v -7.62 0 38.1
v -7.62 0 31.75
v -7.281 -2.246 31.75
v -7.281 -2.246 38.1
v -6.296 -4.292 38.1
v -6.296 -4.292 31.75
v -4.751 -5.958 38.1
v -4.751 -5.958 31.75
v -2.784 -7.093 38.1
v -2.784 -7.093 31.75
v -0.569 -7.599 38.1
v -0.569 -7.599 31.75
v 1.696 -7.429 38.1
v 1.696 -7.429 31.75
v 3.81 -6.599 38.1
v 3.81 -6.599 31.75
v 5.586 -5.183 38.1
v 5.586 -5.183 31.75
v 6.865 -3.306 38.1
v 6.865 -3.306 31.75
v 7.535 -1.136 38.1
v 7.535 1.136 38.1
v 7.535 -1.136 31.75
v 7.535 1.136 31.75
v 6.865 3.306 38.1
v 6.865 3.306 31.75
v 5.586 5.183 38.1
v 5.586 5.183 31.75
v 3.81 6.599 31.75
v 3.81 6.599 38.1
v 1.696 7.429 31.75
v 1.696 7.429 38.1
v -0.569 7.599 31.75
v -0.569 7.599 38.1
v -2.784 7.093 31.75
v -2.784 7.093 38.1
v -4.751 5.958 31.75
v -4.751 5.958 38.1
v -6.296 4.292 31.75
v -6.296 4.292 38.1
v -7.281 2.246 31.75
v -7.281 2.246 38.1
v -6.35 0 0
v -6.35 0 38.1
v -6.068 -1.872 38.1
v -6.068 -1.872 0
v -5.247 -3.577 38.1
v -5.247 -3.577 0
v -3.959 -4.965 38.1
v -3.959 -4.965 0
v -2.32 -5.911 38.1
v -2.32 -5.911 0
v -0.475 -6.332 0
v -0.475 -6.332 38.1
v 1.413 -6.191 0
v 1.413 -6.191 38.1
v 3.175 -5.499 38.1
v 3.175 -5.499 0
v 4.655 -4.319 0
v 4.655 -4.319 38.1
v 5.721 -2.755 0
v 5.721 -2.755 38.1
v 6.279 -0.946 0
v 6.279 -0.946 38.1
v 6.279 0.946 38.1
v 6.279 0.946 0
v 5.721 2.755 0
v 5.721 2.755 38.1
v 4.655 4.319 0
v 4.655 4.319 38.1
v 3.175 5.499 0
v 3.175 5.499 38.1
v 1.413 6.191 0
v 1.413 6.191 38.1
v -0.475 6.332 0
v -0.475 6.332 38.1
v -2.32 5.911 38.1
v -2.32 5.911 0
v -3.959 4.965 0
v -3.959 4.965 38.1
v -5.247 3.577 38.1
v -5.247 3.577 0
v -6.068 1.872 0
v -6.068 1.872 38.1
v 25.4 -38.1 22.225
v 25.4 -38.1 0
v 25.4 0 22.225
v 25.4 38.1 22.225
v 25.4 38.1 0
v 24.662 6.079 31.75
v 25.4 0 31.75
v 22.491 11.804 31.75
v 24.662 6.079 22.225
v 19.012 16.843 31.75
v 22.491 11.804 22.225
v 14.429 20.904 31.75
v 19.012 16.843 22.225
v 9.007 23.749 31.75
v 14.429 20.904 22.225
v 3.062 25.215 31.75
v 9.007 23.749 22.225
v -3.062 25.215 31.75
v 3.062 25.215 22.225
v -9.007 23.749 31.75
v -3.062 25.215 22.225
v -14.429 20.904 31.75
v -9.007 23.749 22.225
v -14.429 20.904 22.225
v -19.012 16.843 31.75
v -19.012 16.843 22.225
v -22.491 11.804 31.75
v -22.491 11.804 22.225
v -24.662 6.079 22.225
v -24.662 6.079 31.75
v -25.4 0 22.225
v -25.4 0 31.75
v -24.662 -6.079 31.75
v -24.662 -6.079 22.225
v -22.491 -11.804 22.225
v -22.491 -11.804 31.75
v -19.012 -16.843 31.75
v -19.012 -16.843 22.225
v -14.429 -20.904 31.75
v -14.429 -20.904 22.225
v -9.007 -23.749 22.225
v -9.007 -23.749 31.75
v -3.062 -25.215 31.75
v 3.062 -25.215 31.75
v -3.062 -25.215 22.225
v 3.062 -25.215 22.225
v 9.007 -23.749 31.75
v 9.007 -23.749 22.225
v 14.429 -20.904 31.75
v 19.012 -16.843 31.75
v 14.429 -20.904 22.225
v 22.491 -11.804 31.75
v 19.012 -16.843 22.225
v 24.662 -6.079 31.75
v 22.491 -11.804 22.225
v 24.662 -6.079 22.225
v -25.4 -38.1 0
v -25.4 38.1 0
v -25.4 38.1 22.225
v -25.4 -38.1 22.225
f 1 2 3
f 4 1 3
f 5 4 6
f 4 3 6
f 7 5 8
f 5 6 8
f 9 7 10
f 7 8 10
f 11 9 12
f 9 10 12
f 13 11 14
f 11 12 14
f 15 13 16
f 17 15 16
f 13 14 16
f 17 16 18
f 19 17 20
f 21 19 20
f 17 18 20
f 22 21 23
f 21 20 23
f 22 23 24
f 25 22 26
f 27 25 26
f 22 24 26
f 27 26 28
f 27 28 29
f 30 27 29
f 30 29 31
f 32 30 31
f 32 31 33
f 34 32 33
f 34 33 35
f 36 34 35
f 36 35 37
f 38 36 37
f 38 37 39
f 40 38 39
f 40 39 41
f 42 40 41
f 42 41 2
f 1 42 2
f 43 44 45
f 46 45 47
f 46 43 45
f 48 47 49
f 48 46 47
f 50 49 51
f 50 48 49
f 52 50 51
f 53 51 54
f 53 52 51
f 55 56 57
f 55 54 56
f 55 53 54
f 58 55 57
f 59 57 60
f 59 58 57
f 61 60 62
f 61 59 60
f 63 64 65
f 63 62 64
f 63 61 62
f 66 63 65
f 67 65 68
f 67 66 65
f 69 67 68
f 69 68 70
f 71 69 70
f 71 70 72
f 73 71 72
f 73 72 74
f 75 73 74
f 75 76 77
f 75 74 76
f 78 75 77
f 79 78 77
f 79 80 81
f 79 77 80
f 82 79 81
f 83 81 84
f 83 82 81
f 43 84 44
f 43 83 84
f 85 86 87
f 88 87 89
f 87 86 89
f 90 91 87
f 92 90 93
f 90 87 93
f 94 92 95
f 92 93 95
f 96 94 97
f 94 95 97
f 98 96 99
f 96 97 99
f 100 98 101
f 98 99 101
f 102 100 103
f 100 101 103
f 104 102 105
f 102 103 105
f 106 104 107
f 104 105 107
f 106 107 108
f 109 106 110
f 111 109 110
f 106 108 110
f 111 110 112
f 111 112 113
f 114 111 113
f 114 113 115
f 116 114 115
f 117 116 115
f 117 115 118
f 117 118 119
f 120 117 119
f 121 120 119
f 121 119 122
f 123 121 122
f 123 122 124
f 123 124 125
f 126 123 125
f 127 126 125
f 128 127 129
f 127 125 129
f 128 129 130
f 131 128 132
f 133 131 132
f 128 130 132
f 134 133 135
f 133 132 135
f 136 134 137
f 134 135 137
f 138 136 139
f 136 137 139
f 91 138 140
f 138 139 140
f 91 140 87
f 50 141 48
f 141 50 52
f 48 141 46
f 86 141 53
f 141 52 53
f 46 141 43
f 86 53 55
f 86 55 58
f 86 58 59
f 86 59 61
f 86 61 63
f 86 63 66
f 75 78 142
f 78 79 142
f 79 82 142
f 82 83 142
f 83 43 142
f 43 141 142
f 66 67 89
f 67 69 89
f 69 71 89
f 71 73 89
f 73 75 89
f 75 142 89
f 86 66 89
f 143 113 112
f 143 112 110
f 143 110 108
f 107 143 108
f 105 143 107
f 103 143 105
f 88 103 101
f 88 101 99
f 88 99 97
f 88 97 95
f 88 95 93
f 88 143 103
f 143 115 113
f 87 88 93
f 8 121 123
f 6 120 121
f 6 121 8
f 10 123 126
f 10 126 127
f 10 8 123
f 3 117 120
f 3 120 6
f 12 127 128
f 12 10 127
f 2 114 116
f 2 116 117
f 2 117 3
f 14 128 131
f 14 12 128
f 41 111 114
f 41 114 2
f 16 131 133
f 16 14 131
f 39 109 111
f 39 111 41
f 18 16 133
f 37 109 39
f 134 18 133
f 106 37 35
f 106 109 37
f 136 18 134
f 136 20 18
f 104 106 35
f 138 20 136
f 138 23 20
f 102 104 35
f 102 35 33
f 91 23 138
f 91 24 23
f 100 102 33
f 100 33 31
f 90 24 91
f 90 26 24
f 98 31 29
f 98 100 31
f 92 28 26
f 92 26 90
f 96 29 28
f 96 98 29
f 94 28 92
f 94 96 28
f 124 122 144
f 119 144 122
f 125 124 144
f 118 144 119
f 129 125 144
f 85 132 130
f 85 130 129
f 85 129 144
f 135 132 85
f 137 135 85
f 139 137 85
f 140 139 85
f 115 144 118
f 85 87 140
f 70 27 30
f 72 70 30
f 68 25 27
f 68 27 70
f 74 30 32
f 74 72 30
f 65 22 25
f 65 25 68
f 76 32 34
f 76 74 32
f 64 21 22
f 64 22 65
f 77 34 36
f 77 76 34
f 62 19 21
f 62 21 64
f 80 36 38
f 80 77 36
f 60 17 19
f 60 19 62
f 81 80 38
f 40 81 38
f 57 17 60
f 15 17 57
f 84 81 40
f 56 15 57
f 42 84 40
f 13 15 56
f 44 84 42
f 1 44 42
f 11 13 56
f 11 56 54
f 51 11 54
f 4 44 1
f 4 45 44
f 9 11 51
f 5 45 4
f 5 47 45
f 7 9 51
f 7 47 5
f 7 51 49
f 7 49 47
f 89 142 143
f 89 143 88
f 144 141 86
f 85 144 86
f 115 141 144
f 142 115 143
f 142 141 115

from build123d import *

# Parameters (mm, degrees)
SKETCH1_R           = 25.4
BOSS_EXTRUDE1_DEPTH = 31.75
SKETCH2_R           = 7.62
BOSS_EXTRUDE2_DEPTH = 38.1
SKETCH3_W           = 50.8
SKETCH3_H           = 76.2
BOSS_EXTRUDE3_DEPTH = 22.225
SKETCH4_R           = 6.35
CUT_EXTRUDE1_DEPTH  = 60.56828015


with BuildPart() as part:
    # Sketch1 → Boss-Extrude1 (new body)
    with BuildSketch(Plane.XY):
        Circle(SKETCH1_R)
    extrude(amount=BOSS_EXTRUDE1_DEPTH)

    # Sketch2 → Boss-Extrude2 (add)
    with BuildSketch(Plane.XY):
        with Locations(Location((0, 0, 0), (0, 0, 180))):
            Circle(SKETCH2_R)
    extrude(amount=BOSS_EXTRUDE2_DEPTH)

    # Sketch3 → Boss-Extrude3 (add)
    with BuildSketch(Plane.XY):
        Rectangle(SKETCH3_W, SKETCH3_H)
    extrude(amount=BOSS_EXTRUDE3_DEPTH)

    # Sketch4 → Cut-Extrude1 (cut, through all)
    with BuildSketch(Plane.XY):
        with Locations(Location((0, 0, 0), (0, 0, 180))):
            Circle(SKETCH4_R)
    extrude(amount=CUT_EXTRUDE1_DEPTH, mode=Mode.SUBTRACT)


solid = part.part
